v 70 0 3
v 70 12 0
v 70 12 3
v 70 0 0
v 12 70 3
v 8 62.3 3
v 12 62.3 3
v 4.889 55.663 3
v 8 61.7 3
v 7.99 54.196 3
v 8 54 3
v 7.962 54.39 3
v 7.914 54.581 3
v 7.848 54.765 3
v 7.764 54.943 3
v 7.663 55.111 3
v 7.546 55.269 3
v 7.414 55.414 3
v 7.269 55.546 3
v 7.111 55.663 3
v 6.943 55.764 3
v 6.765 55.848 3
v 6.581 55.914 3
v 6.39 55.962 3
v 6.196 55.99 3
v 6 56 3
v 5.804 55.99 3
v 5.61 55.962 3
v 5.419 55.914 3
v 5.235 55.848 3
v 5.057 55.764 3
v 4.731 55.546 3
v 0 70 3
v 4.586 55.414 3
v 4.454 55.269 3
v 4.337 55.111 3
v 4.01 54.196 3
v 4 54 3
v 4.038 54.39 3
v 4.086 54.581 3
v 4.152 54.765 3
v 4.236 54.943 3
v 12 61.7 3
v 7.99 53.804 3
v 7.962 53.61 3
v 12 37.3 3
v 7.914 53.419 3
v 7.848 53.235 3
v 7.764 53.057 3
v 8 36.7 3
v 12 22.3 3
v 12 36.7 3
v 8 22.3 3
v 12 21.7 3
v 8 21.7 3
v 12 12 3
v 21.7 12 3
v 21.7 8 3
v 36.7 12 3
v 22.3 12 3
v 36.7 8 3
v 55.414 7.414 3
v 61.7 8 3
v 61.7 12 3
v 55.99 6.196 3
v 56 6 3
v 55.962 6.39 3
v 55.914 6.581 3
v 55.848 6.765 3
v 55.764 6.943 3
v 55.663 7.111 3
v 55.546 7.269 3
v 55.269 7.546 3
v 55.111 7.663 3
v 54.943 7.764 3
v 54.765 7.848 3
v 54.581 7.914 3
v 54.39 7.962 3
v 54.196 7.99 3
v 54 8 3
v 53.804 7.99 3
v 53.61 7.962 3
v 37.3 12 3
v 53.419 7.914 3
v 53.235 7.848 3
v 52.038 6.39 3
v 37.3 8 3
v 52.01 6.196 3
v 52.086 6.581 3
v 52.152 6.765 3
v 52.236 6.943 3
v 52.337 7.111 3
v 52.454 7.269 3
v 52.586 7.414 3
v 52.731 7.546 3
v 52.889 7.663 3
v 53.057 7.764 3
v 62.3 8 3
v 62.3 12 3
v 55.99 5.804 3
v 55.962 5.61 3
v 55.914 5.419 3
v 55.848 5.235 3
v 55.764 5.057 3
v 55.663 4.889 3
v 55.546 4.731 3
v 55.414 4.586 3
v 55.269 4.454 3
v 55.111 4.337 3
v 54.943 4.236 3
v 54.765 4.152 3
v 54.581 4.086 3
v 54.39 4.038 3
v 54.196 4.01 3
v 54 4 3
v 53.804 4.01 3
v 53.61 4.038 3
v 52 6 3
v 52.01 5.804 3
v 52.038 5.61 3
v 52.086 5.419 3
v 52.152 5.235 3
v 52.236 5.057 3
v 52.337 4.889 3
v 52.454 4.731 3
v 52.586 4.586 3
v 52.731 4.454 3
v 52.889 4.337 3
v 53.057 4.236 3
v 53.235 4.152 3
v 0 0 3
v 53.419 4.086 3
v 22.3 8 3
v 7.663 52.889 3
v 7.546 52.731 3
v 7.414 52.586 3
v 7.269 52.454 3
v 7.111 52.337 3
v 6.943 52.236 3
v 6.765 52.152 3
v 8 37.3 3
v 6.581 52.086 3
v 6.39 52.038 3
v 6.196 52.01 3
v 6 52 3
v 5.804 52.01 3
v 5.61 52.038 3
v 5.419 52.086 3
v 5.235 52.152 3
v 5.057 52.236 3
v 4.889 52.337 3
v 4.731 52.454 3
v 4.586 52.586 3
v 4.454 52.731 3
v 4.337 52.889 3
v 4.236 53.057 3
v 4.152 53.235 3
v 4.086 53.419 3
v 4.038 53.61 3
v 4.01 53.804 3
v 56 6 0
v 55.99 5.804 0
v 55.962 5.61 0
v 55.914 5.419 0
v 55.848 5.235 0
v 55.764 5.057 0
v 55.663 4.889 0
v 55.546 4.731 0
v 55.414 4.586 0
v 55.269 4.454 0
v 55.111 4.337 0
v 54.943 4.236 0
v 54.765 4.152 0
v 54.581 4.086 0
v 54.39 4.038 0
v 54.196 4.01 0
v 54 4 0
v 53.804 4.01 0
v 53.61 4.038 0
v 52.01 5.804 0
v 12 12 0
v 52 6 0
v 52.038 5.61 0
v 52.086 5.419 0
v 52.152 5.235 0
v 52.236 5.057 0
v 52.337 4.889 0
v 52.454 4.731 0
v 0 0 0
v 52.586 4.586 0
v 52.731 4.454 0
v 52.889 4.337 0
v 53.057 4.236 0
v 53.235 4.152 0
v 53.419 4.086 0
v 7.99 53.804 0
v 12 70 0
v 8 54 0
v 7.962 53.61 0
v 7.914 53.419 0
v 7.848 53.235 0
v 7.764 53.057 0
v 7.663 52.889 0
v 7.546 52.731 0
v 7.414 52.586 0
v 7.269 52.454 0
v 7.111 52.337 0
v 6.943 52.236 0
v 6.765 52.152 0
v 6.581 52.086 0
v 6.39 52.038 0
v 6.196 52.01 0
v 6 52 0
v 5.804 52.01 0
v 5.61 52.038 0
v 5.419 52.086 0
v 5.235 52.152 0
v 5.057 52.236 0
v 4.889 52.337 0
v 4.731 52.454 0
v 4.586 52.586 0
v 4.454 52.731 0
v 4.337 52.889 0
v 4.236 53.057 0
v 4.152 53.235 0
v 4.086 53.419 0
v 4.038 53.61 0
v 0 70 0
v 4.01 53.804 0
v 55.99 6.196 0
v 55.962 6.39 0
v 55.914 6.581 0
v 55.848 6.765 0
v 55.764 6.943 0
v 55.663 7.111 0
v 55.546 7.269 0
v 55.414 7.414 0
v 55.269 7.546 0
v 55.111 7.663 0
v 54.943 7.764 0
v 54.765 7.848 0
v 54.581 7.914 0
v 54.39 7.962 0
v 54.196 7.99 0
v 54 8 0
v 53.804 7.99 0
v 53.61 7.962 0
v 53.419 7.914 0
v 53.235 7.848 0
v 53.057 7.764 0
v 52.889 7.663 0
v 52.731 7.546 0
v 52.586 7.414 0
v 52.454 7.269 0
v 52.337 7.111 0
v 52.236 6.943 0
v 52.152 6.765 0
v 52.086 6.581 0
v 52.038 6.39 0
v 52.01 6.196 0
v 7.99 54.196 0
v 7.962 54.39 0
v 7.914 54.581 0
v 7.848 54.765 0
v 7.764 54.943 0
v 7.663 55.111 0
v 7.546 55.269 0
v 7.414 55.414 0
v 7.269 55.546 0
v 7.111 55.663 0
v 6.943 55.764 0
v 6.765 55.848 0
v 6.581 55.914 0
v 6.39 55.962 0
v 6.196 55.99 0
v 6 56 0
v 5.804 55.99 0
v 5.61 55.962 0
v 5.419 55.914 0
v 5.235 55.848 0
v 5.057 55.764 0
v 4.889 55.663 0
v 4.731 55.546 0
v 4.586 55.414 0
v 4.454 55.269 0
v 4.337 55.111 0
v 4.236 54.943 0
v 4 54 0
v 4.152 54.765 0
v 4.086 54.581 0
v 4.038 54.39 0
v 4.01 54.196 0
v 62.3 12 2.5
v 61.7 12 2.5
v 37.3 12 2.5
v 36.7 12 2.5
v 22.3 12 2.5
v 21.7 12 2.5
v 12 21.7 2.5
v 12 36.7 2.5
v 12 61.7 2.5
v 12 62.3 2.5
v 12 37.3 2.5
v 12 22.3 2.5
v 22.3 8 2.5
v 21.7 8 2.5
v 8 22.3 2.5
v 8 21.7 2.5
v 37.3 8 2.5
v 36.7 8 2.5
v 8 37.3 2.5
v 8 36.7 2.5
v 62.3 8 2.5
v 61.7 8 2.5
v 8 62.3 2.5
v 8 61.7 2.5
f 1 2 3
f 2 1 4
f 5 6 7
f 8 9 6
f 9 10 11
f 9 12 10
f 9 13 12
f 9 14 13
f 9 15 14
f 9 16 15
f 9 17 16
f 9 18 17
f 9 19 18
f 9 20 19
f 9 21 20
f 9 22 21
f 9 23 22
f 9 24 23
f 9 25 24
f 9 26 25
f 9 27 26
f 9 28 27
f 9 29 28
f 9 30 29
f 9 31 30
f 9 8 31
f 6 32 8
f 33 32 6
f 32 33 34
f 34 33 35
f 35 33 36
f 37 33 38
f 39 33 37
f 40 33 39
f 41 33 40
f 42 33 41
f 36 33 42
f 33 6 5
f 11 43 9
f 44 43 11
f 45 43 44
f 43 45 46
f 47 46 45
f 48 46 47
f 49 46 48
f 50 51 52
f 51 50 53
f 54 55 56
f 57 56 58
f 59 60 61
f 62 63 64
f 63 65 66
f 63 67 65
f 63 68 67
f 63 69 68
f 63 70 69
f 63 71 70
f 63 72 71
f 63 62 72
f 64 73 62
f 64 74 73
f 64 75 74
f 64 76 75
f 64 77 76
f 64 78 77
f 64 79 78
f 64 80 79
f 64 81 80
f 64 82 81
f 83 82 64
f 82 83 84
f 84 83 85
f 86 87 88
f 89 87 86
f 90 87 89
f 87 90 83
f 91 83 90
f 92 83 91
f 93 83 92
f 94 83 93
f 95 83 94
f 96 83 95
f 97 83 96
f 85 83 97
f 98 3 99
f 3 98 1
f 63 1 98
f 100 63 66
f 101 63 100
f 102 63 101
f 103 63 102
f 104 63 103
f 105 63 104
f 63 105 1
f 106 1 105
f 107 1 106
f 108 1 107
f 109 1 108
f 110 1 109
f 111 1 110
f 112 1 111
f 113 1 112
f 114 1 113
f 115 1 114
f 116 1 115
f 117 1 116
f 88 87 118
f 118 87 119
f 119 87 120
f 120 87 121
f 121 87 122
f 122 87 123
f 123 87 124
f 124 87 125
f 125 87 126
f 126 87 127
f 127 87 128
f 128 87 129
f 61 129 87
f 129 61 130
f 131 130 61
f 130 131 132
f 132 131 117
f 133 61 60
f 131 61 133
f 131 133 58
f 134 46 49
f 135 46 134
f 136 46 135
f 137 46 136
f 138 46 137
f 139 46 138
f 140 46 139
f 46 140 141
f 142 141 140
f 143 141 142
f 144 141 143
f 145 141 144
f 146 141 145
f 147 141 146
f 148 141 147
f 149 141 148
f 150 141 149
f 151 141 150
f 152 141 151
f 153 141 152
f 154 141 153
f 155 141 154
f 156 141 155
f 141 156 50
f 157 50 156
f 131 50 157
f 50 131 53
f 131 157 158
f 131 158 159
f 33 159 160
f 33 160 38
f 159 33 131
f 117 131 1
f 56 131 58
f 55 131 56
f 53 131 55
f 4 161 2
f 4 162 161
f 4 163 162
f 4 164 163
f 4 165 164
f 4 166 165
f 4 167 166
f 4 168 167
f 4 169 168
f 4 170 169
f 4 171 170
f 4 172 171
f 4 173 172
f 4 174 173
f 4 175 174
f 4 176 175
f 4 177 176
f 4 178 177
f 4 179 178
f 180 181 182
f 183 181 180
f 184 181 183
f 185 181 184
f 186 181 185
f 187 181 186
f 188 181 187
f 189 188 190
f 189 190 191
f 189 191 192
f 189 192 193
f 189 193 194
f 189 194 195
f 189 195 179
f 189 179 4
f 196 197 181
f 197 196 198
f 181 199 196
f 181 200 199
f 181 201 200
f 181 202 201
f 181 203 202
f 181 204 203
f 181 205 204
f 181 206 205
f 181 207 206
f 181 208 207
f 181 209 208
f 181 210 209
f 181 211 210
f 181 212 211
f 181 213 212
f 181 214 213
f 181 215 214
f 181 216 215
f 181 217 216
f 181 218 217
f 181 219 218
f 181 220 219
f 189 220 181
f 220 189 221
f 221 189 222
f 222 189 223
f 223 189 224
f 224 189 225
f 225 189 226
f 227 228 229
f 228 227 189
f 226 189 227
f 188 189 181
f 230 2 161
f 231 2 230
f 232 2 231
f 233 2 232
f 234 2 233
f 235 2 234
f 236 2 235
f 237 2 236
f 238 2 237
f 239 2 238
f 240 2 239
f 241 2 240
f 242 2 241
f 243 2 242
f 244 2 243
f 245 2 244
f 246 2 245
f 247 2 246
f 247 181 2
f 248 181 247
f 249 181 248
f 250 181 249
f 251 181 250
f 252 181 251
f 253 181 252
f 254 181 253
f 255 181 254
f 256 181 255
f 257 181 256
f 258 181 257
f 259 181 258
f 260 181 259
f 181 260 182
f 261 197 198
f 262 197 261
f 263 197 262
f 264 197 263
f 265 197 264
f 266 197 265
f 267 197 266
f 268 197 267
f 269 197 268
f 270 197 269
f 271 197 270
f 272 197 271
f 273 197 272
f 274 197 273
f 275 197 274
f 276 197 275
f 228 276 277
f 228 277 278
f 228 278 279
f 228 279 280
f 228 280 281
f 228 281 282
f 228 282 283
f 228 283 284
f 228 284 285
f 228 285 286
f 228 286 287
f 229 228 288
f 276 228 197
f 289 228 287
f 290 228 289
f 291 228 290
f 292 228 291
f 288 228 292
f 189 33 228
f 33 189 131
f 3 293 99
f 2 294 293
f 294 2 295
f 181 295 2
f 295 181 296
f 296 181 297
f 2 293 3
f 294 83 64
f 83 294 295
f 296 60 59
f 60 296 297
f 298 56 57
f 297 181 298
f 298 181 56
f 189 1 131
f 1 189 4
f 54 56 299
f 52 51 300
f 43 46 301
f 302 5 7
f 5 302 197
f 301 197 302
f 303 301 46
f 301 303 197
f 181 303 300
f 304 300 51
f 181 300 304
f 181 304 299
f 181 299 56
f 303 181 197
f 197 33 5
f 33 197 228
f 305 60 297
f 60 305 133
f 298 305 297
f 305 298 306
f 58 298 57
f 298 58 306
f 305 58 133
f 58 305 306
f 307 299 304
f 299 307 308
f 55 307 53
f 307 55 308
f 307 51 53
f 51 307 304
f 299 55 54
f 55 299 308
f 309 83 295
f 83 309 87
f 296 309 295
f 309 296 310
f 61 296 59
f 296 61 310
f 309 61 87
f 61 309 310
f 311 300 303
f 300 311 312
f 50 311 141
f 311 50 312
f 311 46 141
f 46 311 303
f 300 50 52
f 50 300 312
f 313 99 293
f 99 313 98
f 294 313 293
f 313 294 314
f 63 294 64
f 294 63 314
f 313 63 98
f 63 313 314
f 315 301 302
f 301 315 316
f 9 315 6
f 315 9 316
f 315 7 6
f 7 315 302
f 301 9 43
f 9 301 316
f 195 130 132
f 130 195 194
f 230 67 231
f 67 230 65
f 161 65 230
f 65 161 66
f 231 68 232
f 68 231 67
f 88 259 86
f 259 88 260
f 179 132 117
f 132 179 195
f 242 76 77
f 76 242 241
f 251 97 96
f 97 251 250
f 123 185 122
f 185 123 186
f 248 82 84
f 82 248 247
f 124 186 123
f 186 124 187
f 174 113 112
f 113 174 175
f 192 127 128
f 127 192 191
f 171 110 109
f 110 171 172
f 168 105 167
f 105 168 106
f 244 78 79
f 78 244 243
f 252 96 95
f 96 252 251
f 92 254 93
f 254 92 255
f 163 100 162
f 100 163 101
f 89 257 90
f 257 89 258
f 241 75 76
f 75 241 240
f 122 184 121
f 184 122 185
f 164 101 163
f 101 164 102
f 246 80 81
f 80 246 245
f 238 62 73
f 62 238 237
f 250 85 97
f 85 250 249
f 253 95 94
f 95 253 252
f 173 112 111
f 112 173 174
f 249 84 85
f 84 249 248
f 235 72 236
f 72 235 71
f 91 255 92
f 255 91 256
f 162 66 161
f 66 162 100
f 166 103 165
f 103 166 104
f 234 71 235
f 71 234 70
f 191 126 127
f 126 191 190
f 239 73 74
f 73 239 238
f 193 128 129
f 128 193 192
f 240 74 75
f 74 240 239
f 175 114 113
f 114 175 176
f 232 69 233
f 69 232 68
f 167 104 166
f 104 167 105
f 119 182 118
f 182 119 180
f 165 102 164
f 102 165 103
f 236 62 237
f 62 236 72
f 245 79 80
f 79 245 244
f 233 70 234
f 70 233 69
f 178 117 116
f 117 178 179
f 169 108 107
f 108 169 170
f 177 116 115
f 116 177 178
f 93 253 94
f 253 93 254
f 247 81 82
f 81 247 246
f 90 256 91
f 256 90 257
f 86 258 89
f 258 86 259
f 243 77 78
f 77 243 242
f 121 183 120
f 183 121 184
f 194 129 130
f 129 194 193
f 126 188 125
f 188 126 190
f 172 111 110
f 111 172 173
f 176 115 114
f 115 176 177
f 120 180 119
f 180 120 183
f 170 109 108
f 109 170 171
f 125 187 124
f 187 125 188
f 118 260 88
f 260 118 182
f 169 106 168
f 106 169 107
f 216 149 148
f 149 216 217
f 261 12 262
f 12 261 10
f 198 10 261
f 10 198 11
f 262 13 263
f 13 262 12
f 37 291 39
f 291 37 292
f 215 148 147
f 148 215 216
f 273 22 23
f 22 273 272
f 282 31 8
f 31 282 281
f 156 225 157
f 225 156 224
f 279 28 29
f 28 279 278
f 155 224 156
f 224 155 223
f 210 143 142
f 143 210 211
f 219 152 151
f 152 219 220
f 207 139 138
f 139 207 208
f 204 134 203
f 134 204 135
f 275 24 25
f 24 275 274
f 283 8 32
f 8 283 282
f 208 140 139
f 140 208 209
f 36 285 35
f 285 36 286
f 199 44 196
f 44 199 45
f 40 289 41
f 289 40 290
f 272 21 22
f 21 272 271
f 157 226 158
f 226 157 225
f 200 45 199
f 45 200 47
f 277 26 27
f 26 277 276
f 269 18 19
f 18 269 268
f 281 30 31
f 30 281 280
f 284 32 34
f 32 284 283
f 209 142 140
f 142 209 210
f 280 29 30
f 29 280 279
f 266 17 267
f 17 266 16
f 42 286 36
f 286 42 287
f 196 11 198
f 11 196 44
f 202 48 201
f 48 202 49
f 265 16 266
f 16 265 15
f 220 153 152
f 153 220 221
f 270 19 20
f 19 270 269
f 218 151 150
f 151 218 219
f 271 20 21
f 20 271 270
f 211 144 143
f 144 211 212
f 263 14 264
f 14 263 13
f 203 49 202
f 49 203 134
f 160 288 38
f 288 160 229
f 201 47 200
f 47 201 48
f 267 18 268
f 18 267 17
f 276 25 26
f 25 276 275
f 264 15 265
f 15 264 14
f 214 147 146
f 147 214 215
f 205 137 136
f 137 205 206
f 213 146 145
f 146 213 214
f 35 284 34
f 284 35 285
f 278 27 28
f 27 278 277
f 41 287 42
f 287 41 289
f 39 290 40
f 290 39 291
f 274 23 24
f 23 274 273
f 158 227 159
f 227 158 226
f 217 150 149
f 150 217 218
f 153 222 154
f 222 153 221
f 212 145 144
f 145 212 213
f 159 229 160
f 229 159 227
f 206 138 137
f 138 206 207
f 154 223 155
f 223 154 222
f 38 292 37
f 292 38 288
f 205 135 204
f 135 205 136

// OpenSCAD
// SPDX-FileCopyrightText: 2026 Sewlore
// SPDX-License-Identifier: MIT
// Original CAD model. Dimensions are millimetres; this is an unprinted prototype.

leg_length = 70;       // Overall X and Y extent, mm
arm_width = 12;        // Both arms, mm
thickness = 3;         // Body height, mm
view_hole_diameter = 4;
engrave_depth = 0.5;
tick_width = 0.6;
tick_offsets = [10, 25, 50]; // Distance along each inner edge from the inside corner
$fn = 64;

assert(leg_length >= 65 && leg_length <= 250, "leg_length must be 65..250 mm");
assert(arm_width >= 8 && arm_width <= 20, "arm_width must be 8..20 mm");
assert(thickness >= 2 && thickness <= 8, "thickness must be 2..8 mm");
assert(view_hole_diameter > 0 && view_hole_diameter < arm_width - 2, "Hole leaves at least 1 mm each side");
assert(engrave_depth > 0 && engrave_depth < thickness / 2, "Engraving must leave the body intact");

module datum_gauge() {
    difference() {
        union() {
            cube([leg_length, arm_width, thickness]);
            cube([arm_width, leg_length, thickness]);
        }
        // Two windows through the body, away from the datum and reference ticks.
        translate([leg_length - 16, arm_width / 2, -1])
            cylinder(h = thickness + 2, d = view_hole_diameter);
        translate([arm_width / 2, leg_length - 16, -1])
            cylinder(h = thickness + 2, d = view_hole_diameter);
        for (offset = tick_offsets) {
            if (arm_width + offset < leg_length - 2) {
                translate([arm_width + offset - tick_width / 2, arm_width - 4, thickness - engrave_depth])
                    cube([tick_width, 4.1, engrave_depth + 1]);
                translate([arm_width - 4, arm_width + offset - tick_width / 2, thickness - engrave_depth])
                    cube([4.1, tick_width, engrave_depth + 1]);
            }
        }
    }
}
datum_gauge();
